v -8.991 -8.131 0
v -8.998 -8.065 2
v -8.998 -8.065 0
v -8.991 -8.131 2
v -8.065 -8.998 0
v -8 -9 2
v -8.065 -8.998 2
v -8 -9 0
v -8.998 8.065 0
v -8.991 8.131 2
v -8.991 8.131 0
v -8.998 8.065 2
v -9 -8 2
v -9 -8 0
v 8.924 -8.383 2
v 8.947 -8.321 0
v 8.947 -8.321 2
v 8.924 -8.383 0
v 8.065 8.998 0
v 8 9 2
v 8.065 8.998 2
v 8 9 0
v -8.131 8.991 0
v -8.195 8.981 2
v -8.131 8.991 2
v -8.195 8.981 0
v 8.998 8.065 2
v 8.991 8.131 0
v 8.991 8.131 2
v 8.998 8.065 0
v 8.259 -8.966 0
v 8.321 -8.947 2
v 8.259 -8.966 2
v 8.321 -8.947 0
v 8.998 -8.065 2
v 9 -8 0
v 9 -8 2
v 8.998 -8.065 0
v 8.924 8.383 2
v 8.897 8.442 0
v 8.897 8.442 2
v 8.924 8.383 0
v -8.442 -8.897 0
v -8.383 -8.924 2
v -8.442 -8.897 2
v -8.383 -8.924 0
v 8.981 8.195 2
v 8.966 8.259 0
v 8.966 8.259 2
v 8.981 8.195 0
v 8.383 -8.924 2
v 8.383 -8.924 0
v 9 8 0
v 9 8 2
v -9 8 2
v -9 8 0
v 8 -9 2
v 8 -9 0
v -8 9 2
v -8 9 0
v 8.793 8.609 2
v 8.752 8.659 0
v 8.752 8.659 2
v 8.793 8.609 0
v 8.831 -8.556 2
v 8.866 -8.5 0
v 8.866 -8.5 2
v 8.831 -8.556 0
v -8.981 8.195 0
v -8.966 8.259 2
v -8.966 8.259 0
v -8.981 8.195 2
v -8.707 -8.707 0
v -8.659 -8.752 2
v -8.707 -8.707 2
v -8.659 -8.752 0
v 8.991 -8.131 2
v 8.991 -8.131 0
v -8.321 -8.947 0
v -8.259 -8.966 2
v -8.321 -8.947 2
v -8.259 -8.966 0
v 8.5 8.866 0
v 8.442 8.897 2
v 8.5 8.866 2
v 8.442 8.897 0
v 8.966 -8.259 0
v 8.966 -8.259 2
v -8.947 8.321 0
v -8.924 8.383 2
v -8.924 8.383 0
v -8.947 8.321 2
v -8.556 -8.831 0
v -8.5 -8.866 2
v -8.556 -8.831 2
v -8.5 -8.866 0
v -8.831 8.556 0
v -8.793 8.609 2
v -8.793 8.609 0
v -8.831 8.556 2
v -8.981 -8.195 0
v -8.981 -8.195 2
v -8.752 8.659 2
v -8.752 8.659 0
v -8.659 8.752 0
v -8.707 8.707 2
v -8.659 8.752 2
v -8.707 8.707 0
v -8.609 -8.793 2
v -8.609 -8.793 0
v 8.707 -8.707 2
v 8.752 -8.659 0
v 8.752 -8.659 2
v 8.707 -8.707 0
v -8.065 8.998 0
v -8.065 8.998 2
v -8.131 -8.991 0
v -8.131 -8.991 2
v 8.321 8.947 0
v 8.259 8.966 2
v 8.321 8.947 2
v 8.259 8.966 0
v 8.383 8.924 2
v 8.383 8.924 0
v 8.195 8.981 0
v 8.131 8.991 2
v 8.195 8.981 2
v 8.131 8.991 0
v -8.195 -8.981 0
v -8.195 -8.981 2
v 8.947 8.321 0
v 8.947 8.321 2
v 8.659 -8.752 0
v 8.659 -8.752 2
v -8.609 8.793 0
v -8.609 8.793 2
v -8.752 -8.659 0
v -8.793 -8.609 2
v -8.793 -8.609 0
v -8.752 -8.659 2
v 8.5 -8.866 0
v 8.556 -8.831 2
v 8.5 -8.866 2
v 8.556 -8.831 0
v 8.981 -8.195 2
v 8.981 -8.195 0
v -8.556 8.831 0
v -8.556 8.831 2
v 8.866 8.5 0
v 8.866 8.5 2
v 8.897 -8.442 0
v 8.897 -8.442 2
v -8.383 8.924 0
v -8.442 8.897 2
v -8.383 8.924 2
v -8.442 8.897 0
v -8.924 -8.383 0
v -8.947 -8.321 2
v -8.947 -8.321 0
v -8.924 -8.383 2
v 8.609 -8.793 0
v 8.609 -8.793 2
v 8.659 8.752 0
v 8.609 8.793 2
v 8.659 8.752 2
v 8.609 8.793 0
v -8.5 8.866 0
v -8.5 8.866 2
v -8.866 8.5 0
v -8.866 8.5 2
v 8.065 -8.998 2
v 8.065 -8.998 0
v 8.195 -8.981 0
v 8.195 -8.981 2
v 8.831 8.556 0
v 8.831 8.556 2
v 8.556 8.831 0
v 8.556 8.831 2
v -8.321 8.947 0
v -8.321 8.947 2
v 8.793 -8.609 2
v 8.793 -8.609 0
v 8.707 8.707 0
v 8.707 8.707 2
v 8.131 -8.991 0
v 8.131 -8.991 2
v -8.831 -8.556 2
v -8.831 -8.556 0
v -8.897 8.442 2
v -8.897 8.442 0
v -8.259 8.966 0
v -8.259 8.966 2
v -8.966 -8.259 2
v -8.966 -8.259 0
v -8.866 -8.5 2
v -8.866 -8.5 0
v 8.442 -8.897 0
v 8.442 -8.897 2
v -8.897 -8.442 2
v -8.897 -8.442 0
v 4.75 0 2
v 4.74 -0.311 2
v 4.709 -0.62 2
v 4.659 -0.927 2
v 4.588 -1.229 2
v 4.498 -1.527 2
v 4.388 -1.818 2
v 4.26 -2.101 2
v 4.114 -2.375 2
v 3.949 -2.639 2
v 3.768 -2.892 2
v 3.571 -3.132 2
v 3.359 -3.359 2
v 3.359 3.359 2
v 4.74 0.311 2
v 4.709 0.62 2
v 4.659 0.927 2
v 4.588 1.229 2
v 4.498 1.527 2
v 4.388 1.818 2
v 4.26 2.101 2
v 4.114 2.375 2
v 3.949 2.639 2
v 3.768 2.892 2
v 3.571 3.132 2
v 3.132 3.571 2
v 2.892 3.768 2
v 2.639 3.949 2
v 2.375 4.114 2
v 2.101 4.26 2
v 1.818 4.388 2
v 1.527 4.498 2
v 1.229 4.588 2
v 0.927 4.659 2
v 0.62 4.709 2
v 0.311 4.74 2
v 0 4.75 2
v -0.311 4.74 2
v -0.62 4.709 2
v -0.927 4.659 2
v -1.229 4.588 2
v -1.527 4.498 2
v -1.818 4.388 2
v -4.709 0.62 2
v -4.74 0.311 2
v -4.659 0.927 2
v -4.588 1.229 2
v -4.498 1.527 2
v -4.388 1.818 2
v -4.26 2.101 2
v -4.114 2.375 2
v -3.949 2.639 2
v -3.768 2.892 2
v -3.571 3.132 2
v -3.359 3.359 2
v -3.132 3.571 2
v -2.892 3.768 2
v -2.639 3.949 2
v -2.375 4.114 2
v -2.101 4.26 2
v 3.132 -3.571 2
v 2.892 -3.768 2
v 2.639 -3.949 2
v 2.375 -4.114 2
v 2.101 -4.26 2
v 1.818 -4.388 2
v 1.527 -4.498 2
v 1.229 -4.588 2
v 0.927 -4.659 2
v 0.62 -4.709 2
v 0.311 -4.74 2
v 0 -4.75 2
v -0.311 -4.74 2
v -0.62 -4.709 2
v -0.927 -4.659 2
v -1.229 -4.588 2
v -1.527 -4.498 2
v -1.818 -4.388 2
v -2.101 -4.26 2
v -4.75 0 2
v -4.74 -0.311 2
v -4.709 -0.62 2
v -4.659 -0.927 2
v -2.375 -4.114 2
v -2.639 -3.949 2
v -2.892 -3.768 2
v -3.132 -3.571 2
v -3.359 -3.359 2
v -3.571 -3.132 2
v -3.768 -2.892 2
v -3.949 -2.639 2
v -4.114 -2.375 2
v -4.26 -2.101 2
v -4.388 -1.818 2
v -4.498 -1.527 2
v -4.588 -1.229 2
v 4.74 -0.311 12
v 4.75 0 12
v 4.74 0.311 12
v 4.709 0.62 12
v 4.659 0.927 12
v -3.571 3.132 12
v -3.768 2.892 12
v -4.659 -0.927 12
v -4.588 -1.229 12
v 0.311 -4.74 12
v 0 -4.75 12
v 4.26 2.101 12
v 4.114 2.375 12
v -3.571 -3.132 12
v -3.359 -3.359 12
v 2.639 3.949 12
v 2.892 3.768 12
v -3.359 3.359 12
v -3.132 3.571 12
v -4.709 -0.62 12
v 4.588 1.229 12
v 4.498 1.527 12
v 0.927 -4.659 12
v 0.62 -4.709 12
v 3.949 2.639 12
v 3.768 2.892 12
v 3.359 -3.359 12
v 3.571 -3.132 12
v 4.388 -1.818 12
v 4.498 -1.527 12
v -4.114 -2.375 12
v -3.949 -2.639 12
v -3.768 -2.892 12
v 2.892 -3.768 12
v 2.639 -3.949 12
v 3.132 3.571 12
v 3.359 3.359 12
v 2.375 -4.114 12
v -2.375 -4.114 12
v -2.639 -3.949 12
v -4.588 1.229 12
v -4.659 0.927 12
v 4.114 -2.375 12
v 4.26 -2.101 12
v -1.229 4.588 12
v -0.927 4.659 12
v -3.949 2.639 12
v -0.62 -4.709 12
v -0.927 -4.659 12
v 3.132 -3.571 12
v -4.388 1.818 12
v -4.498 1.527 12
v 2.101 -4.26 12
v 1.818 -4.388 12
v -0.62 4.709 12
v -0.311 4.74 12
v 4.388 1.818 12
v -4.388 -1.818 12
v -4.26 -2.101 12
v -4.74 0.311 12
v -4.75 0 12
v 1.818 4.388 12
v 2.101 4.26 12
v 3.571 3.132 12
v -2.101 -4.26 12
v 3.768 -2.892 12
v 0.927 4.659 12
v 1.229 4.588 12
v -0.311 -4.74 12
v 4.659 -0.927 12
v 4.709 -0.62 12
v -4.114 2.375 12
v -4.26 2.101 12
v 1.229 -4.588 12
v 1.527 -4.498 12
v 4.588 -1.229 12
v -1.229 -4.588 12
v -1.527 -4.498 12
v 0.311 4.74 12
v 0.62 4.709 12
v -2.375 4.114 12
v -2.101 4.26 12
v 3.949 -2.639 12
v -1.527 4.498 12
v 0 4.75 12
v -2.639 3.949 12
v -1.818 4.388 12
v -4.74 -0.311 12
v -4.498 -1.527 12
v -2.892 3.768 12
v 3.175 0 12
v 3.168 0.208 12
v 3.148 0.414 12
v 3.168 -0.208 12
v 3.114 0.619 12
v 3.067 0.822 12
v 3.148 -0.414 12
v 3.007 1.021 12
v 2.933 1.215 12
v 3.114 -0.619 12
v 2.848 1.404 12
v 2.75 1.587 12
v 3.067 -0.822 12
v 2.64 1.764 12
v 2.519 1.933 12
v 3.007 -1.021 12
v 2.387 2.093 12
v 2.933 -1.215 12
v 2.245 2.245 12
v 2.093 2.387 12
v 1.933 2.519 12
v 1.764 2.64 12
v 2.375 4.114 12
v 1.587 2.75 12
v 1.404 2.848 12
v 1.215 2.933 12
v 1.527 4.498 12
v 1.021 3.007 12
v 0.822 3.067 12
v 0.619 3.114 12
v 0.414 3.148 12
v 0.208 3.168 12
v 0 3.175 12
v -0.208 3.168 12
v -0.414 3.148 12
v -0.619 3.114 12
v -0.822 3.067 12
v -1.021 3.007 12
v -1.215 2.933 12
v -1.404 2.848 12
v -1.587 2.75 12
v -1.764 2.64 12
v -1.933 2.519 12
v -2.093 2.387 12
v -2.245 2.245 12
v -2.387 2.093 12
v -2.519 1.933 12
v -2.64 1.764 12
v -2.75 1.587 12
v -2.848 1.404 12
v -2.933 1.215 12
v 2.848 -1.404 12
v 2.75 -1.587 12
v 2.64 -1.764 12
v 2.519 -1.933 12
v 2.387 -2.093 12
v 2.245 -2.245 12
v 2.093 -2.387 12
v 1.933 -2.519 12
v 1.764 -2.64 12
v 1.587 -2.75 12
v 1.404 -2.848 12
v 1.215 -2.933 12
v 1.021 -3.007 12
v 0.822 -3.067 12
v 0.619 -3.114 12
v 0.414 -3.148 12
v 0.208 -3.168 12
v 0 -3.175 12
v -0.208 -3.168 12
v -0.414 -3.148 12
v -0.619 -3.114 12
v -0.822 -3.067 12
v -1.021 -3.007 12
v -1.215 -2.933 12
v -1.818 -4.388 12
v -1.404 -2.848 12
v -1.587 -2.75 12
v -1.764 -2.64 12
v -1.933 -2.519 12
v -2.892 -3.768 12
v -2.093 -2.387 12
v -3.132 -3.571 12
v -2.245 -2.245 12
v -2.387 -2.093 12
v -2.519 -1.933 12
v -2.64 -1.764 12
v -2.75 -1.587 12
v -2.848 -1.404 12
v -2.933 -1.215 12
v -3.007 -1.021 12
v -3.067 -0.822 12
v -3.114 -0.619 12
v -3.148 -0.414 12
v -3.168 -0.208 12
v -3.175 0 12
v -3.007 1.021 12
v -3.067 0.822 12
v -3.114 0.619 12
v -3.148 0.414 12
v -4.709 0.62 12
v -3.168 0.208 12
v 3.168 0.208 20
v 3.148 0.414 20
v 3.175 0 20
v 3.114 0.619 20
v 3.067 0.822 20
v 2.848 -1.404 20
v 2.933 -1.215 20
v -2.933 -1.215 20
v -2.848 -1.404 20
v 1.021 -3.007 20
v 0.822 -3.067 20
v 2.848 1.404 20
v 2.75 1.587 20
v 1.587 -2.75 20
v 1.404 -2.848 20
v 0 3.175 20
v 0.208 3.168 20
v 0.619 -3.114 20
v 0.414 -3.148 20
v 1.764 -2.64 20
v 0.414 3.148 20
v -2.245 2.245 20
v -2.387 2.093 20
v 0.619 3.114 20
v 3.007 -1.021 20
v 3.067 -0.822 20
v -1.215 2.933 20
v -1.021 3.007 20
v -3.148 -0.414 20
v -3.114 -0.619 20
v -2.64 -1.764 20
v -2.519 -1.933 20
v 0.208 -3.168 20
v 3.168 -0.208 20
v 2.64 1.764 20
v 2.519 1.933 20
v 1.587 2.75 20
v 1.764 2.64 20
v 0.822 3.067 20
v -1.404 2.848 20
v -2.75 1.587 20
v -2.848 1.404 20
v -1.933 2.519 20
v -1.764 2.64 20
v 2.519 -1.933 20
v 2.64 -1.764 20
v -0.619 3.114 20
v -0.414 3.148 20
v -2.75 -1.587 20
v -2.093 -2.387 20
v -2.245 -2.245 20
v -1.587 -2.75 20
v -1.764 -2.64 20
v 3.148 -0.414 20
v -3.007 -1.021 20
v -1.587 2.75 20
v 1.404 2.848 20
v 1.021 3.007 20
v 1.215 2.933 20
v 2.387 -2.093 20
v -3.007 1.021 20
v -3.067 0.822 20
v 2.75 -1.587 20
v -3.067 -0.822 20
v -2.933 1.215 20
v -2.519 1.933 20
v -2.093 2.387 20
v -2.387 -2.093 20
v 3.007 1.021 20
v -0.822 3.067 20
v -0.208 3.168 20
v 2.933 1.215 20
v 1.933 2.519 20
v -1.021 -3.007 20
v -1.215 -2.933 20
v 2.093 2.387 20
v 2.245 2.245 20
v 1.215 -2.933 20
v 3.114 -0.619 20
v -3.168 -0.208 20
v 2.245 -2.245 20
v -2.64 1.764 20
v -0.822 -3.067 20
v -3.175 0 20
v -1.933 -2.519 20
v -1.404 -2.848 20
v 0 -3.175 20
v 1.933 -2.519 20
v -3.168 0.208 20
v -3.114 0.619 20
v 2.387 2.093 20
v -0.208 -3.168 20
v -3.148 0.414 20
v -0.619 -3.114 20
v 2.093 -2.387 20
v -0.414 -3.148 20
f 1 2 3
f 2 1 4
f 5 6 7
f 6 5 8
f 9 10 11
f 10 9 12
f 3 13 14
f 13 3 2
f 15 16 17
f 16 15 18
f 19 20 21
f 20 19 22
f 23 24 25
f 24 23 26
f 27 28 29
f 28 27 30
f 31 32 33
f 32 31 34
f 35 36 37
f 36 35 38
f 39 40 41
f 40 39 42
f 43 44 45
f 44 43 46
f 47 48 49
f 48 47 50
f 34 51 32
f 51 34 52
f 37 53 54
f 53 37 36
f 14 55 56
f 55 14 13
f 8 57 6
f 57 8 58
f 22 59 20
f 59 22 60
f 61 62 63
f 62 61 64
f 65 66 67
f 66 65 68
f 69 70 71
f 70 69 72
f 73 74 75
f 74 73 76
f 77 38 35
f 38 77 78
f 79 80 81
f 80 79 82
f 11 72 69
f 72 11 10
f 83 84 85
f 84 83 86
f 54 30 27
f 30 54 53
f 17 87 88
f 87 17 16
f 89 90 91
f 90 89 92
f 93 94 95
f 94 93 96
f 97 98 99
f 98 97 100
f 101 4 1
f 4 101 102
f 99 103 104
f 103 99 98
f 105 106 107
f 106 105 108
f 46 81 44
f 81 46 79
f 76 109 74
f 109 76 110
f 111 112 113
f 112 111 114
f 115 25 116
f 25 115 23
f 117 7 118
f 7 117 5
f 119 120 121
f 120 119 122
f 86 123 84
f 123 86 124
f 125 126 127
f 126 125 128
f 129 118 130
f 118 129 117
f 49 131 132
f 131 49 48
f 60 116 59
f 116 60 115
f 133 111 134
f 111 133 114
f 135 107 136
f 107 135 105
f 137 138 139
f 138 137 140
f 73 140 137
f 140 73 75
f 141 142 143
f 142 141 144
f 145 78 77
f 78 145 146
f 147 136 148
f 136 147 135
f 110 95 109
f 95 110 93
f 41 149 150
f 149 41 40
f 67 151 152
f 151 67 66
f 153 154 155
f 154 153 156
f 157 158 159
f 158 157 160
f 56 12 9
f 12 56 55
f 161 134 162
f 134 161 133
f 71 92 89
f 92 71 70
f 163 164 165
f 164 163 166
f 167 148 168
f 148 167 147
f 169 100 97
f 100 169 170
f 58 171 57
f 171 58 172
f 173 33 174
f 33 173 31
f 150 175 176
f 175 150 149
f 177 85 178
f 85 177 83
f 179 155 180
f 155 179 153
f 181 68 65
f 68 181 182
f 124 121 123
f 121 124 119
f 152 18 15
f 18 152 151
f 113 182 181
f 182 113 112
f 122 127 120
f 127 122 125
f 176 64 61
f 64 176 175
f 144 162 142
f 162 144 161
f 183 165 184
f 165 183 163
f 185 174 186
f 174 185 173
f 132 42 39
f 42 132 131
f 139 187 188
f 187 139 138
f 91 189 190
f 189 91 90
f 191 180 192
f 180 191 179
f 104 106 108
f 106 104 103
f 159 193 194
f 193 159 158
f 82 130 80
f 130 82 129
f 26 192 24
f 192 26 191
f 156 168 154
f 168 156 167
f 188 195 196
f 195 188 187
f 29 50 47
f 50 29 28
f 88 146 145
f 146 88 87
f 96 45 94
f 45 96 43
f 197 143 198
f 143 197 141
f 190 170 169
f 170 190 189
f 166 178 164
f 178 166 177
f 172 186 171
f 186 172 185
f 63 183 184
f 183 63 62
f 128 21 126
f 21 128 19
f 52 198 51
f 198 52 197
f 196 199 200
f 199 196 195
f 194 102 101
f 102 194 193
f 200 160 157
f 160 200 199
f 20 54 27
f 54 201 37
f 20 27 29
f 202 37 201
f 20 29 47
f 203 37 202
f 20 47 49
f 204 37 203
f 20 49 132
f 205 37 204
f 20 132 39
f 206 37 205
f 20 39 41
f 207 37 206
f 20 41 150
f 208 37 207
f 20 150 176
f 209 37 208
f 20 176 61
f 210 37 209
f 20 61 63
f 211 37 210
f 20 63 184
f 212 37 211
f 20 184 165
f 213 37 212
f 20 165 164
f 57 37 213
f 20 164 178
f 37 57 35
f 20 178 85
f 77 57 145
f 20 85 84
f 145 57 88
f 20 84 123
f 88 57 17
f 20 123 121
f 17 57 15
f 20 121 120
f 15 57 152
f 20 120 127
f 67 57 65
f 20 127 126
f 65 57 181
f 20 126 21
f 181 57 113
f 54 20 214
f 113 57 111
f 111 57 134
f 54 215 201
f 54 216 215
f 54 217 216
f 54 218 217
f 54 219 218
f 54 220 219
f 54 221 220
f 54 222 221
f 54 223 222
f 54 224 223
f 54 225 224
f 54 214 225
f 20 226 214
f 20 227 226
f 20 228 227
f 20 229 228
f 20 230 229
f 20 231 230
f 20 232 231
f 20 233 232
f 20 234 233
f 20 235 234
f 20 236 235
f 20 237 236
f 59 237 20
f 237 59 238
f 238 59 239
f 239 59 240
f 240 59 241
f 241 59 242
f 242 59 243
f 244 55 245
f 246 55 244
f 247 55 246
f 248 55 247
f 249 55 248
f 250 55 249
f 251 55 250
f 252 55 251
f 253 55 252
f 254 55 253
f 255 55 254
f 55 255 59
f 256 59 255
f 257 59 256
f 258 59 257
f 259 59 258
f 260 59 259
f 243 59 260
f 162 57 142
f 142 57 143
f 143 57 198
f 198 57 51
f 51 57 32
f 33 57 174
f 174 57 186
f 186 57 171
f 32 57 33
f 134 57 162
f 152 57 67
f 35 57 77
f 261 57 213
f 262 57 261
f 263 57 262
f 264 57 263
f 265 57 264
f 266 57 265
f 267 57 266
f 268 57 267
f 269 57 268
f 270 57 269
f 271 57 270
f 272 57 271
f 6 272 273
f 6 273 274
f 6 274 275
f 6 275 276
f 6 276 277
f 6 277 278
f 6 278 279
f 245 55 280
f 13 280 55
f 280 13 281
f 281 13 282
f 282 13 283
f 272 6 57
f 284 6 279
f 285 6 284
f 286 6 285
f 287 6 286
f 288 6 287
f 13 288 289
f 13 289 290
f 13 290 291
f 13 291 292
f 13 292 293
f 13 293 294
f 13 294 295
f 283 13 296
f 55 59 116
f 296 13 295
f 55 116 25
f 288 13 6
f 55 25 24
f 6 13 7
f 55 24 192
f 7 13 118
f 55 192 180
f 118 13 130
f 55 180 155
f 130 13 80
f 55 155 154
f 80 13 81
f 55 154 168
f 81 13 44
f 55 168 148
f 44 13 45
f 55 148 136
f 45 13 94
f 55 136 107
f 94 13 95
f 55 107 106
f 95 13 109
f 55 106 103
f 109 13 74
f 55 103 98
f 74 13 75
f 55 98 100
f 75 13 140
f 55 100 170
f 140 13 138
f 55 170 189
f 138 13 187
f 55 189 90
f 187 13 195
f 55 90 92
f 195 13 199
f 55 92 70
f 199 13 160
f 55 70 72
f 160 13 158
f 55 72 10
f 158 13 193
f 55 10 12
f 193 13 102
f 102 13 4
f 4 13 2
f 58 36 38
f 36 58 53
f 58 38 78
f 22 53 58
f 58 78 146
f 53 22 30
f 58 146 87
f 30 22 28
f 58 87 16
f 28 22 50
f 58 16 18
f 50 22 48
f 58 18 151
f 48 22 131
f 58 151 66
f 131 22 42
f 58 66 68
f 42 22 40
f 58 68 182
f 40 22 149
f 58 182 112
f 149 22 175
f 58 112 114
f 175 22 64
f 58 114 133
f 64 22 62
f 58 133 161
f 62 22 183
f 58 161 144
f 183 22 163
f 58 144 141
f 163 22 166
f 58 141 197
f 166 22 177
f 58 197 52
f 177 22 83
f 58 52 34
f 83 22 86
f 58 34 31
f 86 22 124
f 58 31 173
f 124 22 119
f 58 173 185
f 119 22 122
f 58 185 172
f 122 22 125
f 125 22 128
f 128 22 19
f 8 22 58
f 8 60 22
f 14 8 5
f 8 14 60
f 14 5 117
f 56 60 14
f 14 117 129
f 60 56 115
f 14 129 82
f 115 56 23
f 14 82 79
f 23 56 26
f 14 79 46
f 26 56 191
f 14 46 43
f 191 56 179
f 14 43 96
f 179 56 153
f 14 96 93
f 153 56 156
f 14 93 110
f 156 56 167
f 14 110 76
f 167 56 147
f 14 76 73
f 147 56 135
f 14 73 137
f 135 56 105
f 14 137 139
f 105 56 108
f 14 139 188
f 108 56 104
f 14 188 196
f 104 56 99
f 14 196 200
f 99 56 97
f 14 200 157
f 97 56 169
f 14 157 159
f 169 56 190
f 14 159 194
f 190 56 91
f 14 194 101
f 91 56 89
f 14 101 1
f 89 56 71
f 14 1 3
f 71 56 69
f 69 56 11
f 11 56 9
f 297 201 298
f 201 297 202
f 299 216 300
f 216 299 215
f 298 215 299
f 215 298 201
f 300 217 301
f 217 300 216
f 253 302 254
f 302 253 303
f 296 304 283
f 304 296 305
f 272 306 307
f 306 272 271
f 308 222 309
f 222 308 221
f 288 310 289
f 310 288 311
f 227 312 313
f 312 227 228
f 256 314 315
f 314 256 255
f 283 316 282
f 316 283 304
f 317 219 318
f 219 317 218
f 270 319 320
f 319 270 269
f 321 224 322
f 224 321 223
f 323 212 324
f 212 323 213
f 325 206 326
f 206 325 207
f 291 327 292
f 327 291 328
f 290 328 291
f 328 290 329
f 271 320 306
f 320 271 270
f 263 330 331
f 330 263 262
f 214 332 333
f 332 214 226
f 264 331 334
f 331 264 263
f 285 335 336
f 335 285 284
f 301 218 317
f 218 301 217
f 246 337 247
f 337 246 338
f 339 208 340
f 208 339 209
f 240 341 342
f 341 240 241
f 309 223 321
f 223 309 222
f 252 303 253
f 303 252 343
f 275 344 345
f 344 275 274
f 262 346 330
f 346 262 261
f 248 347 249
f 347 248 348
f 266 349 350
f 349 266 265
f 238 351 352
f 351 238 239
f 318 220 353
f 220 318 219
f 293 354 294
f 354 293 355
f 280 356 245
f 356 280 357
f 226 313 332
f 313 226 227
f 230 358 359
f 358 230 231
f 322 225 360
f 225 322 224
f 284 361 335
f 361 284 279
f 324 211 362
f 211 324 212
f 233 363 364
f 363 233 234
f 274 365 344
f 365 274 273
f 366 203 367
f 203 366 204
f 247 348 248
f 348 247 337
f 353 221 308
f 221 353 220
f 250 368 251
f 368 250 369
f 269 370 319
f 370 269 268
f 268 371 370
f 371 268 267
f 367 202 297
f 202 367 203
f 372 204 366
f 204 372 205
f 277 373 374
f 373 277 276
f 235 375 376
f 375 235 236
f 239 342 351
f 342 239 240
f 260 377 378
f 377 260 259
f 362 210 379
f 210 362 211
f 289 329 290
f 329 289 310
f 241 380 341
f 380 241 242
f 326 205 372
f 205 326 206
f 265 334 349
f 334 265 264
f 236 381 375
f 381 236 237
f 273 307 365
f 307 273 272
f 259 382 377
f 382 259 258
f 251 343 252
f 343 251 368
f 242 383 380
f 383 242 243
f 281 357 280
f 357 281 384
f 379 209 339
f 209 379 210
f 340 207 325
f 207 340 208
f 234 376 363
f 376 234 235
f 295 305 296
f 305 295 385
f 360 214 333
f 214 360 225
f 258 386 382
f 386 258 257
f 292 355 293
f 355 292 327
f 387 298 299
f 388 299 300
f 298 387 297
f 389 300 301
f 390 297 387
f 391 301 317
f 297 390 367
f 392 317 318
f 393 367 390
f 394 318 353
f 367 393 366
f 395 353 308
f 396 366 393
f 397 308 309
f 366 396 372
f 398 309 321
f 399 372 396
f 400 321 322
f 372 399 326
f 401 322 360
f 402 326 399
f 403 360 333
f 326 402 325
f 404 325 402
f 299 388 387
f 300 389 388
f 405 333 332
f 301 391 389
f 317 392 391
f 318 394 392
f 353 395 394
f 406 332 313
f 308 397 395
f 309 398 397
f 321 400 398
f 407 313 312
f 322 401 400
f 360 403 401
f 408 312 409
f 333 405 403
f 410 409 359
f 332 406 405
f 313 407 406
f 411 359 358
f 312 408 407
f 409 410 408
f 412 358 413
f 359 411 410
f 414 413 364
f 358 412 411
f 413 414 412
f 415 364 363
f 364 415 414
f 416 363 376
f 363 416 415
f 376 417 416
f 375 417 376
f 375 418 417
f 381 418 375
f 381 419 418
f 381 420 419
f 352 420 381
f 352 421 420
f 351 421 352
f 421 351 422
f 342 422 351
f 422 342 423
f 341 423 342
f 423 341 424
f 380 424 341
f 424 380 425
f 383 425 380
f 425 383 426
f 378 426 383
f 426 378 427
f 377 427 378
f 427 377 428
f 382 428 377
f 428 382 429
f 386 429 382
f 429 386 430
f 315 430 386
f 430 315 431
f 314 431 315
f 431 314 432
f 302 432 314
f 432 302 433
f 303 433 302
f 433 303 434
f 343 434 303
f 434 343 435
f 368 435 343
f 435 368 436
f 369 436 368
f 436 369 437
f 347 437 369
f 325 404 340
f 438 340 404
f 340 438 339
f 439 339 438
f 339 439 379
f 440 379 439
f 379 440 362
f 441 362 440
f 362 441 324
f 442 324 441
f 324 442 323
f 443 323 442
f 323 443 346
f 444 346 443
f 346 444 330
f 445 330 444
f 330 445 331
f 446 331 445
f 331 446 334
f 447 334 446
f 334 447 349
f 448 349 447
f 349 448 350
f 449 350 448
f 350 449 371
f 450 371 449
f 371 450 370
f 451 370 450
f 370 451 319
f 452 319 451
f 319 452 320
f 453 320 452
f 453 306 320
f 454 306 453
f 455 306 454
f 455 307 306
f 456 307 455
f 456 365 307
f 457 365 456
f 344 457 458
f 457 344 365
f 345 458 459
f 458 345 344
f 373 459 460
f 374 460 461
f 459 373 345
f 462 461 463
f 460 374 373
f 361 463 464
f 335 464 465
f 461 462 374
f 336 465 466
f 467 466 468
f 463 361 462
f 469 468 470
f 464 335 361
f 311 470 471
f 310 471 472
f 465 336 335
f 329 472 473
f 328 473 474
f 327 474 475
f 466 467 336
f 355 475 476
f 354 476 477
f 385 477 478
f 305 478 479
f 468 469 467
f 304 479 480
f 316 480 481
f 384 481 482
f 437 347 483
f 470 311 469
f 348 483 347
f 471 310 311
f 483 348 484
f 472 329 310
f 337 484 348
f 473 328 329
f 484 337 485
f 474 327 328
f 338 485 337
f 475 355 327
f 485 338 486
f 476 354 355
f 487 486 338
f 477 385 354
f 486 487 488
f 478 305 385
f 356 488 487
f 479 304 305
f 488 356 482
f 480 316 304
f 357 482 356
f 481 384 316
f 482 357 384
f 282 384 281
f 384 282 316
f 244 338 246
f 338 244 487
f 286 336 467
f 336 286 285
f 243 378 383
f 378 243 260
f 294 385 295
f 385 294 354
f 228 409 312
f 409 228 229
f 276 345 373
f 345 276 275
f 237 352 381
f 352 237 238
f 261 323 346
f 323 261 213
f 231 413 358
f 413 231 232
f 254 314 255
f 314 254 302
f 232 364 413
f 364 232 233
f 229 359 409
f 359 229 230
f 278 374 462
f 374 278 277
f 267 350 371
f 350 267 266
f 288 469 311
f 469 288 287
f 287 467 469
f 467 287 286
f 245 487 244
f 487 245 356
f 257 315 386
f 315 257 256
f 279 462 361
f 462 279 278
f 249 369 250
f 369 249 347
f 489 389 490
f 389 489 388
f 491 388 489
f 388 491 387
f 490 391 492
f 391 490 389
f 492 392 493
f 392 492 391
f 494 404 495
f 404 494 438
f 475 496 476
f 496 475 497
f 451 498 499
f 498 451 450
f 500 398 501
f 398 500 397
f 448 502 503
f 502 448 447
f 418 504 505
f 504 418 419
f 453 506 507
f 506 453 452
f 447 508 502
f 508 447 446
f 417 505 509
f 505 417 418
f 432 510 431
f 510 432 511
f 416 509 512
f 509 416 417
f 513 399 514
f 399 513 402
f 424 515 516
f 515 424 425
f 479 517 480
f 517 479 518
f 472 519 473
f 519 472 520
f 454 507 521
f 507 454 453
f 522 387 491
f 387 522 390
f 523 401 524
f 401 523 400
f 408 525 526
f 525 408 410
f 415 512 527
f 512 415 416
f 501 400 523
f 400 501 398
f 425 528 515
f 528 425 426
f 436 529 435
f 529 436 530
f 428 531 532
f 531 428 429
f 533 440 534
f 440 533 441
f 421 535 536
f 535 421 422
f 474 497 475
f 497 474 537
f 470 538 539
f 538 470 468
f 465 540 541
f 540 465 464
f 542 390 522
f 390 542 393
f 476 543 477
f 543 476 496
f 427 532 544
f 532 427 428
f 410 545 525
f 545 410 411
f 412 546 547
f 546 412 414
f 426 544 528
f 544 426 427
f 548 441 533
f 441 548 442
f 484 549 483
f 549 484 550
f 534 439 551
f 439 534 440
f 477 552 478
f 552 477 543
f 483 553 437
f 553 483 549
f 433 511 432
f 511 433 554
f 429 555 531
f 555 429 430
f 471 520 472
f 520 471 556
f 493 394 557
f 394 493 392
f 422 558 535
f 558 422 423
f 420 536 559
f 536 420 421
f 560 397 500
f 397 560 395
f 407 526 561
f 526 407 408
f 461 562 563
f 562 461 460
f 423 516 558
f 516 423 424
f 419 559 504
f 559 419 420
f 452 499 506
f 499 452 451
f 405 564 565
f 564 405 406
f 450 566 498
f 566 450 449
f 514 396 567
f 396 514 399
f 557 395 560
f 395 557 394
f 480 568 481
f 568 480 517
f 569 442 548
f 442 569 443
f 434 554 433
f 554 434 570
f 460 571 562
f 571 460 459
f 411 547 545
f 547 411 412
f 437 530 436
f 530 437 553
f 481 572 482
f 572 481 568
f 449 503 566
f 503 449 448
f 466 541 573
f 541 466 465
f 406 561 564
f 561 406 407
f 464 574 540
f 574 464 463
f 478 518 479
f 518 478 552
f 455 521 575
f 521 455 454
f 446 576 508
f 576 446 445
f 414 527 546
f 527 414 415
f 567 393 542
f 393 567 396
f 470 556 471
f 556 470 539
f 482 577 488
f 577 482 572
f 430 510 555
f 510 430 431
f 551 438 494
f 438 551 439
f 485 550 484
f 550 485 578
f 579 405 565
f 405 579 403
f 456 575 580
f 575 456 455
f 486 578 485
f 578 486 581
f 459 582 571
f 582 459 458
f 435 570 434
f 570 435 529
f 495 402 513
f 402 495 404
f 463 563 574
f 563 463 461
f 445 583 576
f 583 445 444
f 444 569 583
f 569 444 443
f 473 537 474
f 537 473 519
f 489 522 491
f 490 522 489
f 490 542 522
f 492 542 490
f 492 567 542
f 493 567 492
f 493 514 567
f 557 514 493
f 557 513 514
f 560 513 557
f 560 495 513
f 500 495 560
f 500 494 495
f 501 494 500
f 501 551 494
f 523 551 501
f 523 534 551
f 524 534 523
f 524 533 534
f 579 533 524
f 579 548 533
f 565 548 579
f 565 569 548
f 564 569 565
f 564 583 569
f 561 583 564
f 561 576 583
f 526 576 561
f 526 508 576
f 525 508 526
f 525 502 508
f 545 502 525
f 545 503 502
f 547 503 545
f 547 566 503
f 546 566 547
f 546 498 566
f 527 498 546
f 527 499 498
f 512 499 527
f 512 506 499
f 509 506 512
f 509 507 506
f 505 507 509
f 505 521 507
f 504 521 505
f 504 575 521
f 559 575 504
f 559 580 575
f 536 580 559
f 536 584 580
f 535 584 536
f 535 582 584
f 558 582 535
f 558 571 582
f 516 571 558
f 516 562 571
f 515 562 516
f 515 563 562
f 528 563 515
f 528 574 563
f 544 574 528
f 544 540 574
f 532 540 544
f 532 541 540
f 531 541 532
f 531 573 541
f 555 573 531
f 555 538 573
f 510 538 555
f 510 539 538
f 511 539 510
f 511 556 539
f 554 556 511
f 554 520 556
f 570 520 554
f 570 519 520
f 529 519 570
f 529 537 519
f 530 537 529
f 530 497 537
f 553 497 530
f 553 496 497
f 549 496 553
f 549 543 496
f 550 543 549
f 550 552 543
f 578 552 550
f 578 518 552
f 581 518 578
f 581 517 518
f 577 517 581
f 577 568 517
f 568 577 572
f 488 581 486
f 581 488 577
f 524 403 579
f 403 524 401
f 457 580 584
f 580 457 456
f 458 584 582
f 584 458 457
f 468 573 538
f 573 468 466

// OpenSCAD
/* ---------------------------------------------------------------------------
   Cold shoe stud -- purchased-hardware standin for the square-flange, two-
   step threaded stud that slides into `cold_shoe.scad`'s shoe channel: a
   thin square plate with a 3/8" post rising from it, and a 1/4" post rising
   further from the top of that post (the common flash-stud / umbrella-screw
   shape -- see reference photo). Thread geometry is skipped by request:
   both posts are plain cylinders standing in for the 3/8"-16 and 1/4"-20
   threaded sections, not modeled threads.

   The flange is sized to slide under `cold_shoe.scad`'s lips and be caught
   by them: narrower than that file's channel_w (15mm clear width between
   the side walls) but wider than its gap_w (channel_w - 2*lip_overhang =
   9mm, the open gap between the lip tips) -- read those figures off that
   file rather than `use`-ing it, same as `t_slot_bolt.scad` does for the
   T-slot profile files.

   Coordinate convention: origin centred on the flange in X/Y. Z0 = the
   underside of the flange (the face that rests on the shoe's channel
   floor); both posts rise in +Z from there, the 3/8" post first and the
   1/4" post stacked on top of it.

   Purchased-hardware standin, not a printed structural part -- no
   [Build Plate] or [Revision] group, same reasoning as `t_slot_bolt.scad`.

   REV 1.0: initial.
   --------------------------------------------------------------------------- */

/* [Plate] */
plate_w   = 18;   // square flange width, mm -- fits inside cold_shoe.scad's channel_w (15) and outside its gap_w (9)  [8:0.5:14]
plate_thk = 2;    // flange thickness, mm  [1:0.25:4]
corner_r  = 1;    // corner rounding on the flange, mm (0 = square corners)  [0:0.25:3]

/* [Stud] */
c38_dia = 9.5;   // 3/8" post diameter standin, mm (3/8 in = 9.525mm)  [6:0.5:12]
c38_len = 10;    // 3/8" post height above the plate, mm  [4:0.5:20]
qtr_dia = 6.35;  // 1/4" post diameter standin, mm (1/4 in = 6.35mm)  [4:0.25:8]
qtr_len = 8;     // 1/4" post height above the 3/8" post, mm  [3:0.5:16]

/* [Render] */
$fn = $preview ? 32 : 96;
eps = 0.01;

// ---------------------------------------------------------------------------

module rounded_square(w, r) {
    // plan view (XY): square of side w, centred, corners rounded to r
    hull() for (sx = [-1, 1], sy = [-1, 1])
        translate([sx * (w / 2 - r), sy * (w / 2 - r)]) circle(r);
}

module cold_shoe_stud() {
    linear_extrude(plate_thk) rounded_square(plate_w, corner_r);

    translate([0, 0, plate_thk - eps])
        cylinder(d = c38_dia, h = c38_len + eps);

    translate([0, 0, plate_thk + c38_len - eps])
        cylinder(d = qtr_dia, h = qtr_len + eps);
}

cold_shoe_stud();
